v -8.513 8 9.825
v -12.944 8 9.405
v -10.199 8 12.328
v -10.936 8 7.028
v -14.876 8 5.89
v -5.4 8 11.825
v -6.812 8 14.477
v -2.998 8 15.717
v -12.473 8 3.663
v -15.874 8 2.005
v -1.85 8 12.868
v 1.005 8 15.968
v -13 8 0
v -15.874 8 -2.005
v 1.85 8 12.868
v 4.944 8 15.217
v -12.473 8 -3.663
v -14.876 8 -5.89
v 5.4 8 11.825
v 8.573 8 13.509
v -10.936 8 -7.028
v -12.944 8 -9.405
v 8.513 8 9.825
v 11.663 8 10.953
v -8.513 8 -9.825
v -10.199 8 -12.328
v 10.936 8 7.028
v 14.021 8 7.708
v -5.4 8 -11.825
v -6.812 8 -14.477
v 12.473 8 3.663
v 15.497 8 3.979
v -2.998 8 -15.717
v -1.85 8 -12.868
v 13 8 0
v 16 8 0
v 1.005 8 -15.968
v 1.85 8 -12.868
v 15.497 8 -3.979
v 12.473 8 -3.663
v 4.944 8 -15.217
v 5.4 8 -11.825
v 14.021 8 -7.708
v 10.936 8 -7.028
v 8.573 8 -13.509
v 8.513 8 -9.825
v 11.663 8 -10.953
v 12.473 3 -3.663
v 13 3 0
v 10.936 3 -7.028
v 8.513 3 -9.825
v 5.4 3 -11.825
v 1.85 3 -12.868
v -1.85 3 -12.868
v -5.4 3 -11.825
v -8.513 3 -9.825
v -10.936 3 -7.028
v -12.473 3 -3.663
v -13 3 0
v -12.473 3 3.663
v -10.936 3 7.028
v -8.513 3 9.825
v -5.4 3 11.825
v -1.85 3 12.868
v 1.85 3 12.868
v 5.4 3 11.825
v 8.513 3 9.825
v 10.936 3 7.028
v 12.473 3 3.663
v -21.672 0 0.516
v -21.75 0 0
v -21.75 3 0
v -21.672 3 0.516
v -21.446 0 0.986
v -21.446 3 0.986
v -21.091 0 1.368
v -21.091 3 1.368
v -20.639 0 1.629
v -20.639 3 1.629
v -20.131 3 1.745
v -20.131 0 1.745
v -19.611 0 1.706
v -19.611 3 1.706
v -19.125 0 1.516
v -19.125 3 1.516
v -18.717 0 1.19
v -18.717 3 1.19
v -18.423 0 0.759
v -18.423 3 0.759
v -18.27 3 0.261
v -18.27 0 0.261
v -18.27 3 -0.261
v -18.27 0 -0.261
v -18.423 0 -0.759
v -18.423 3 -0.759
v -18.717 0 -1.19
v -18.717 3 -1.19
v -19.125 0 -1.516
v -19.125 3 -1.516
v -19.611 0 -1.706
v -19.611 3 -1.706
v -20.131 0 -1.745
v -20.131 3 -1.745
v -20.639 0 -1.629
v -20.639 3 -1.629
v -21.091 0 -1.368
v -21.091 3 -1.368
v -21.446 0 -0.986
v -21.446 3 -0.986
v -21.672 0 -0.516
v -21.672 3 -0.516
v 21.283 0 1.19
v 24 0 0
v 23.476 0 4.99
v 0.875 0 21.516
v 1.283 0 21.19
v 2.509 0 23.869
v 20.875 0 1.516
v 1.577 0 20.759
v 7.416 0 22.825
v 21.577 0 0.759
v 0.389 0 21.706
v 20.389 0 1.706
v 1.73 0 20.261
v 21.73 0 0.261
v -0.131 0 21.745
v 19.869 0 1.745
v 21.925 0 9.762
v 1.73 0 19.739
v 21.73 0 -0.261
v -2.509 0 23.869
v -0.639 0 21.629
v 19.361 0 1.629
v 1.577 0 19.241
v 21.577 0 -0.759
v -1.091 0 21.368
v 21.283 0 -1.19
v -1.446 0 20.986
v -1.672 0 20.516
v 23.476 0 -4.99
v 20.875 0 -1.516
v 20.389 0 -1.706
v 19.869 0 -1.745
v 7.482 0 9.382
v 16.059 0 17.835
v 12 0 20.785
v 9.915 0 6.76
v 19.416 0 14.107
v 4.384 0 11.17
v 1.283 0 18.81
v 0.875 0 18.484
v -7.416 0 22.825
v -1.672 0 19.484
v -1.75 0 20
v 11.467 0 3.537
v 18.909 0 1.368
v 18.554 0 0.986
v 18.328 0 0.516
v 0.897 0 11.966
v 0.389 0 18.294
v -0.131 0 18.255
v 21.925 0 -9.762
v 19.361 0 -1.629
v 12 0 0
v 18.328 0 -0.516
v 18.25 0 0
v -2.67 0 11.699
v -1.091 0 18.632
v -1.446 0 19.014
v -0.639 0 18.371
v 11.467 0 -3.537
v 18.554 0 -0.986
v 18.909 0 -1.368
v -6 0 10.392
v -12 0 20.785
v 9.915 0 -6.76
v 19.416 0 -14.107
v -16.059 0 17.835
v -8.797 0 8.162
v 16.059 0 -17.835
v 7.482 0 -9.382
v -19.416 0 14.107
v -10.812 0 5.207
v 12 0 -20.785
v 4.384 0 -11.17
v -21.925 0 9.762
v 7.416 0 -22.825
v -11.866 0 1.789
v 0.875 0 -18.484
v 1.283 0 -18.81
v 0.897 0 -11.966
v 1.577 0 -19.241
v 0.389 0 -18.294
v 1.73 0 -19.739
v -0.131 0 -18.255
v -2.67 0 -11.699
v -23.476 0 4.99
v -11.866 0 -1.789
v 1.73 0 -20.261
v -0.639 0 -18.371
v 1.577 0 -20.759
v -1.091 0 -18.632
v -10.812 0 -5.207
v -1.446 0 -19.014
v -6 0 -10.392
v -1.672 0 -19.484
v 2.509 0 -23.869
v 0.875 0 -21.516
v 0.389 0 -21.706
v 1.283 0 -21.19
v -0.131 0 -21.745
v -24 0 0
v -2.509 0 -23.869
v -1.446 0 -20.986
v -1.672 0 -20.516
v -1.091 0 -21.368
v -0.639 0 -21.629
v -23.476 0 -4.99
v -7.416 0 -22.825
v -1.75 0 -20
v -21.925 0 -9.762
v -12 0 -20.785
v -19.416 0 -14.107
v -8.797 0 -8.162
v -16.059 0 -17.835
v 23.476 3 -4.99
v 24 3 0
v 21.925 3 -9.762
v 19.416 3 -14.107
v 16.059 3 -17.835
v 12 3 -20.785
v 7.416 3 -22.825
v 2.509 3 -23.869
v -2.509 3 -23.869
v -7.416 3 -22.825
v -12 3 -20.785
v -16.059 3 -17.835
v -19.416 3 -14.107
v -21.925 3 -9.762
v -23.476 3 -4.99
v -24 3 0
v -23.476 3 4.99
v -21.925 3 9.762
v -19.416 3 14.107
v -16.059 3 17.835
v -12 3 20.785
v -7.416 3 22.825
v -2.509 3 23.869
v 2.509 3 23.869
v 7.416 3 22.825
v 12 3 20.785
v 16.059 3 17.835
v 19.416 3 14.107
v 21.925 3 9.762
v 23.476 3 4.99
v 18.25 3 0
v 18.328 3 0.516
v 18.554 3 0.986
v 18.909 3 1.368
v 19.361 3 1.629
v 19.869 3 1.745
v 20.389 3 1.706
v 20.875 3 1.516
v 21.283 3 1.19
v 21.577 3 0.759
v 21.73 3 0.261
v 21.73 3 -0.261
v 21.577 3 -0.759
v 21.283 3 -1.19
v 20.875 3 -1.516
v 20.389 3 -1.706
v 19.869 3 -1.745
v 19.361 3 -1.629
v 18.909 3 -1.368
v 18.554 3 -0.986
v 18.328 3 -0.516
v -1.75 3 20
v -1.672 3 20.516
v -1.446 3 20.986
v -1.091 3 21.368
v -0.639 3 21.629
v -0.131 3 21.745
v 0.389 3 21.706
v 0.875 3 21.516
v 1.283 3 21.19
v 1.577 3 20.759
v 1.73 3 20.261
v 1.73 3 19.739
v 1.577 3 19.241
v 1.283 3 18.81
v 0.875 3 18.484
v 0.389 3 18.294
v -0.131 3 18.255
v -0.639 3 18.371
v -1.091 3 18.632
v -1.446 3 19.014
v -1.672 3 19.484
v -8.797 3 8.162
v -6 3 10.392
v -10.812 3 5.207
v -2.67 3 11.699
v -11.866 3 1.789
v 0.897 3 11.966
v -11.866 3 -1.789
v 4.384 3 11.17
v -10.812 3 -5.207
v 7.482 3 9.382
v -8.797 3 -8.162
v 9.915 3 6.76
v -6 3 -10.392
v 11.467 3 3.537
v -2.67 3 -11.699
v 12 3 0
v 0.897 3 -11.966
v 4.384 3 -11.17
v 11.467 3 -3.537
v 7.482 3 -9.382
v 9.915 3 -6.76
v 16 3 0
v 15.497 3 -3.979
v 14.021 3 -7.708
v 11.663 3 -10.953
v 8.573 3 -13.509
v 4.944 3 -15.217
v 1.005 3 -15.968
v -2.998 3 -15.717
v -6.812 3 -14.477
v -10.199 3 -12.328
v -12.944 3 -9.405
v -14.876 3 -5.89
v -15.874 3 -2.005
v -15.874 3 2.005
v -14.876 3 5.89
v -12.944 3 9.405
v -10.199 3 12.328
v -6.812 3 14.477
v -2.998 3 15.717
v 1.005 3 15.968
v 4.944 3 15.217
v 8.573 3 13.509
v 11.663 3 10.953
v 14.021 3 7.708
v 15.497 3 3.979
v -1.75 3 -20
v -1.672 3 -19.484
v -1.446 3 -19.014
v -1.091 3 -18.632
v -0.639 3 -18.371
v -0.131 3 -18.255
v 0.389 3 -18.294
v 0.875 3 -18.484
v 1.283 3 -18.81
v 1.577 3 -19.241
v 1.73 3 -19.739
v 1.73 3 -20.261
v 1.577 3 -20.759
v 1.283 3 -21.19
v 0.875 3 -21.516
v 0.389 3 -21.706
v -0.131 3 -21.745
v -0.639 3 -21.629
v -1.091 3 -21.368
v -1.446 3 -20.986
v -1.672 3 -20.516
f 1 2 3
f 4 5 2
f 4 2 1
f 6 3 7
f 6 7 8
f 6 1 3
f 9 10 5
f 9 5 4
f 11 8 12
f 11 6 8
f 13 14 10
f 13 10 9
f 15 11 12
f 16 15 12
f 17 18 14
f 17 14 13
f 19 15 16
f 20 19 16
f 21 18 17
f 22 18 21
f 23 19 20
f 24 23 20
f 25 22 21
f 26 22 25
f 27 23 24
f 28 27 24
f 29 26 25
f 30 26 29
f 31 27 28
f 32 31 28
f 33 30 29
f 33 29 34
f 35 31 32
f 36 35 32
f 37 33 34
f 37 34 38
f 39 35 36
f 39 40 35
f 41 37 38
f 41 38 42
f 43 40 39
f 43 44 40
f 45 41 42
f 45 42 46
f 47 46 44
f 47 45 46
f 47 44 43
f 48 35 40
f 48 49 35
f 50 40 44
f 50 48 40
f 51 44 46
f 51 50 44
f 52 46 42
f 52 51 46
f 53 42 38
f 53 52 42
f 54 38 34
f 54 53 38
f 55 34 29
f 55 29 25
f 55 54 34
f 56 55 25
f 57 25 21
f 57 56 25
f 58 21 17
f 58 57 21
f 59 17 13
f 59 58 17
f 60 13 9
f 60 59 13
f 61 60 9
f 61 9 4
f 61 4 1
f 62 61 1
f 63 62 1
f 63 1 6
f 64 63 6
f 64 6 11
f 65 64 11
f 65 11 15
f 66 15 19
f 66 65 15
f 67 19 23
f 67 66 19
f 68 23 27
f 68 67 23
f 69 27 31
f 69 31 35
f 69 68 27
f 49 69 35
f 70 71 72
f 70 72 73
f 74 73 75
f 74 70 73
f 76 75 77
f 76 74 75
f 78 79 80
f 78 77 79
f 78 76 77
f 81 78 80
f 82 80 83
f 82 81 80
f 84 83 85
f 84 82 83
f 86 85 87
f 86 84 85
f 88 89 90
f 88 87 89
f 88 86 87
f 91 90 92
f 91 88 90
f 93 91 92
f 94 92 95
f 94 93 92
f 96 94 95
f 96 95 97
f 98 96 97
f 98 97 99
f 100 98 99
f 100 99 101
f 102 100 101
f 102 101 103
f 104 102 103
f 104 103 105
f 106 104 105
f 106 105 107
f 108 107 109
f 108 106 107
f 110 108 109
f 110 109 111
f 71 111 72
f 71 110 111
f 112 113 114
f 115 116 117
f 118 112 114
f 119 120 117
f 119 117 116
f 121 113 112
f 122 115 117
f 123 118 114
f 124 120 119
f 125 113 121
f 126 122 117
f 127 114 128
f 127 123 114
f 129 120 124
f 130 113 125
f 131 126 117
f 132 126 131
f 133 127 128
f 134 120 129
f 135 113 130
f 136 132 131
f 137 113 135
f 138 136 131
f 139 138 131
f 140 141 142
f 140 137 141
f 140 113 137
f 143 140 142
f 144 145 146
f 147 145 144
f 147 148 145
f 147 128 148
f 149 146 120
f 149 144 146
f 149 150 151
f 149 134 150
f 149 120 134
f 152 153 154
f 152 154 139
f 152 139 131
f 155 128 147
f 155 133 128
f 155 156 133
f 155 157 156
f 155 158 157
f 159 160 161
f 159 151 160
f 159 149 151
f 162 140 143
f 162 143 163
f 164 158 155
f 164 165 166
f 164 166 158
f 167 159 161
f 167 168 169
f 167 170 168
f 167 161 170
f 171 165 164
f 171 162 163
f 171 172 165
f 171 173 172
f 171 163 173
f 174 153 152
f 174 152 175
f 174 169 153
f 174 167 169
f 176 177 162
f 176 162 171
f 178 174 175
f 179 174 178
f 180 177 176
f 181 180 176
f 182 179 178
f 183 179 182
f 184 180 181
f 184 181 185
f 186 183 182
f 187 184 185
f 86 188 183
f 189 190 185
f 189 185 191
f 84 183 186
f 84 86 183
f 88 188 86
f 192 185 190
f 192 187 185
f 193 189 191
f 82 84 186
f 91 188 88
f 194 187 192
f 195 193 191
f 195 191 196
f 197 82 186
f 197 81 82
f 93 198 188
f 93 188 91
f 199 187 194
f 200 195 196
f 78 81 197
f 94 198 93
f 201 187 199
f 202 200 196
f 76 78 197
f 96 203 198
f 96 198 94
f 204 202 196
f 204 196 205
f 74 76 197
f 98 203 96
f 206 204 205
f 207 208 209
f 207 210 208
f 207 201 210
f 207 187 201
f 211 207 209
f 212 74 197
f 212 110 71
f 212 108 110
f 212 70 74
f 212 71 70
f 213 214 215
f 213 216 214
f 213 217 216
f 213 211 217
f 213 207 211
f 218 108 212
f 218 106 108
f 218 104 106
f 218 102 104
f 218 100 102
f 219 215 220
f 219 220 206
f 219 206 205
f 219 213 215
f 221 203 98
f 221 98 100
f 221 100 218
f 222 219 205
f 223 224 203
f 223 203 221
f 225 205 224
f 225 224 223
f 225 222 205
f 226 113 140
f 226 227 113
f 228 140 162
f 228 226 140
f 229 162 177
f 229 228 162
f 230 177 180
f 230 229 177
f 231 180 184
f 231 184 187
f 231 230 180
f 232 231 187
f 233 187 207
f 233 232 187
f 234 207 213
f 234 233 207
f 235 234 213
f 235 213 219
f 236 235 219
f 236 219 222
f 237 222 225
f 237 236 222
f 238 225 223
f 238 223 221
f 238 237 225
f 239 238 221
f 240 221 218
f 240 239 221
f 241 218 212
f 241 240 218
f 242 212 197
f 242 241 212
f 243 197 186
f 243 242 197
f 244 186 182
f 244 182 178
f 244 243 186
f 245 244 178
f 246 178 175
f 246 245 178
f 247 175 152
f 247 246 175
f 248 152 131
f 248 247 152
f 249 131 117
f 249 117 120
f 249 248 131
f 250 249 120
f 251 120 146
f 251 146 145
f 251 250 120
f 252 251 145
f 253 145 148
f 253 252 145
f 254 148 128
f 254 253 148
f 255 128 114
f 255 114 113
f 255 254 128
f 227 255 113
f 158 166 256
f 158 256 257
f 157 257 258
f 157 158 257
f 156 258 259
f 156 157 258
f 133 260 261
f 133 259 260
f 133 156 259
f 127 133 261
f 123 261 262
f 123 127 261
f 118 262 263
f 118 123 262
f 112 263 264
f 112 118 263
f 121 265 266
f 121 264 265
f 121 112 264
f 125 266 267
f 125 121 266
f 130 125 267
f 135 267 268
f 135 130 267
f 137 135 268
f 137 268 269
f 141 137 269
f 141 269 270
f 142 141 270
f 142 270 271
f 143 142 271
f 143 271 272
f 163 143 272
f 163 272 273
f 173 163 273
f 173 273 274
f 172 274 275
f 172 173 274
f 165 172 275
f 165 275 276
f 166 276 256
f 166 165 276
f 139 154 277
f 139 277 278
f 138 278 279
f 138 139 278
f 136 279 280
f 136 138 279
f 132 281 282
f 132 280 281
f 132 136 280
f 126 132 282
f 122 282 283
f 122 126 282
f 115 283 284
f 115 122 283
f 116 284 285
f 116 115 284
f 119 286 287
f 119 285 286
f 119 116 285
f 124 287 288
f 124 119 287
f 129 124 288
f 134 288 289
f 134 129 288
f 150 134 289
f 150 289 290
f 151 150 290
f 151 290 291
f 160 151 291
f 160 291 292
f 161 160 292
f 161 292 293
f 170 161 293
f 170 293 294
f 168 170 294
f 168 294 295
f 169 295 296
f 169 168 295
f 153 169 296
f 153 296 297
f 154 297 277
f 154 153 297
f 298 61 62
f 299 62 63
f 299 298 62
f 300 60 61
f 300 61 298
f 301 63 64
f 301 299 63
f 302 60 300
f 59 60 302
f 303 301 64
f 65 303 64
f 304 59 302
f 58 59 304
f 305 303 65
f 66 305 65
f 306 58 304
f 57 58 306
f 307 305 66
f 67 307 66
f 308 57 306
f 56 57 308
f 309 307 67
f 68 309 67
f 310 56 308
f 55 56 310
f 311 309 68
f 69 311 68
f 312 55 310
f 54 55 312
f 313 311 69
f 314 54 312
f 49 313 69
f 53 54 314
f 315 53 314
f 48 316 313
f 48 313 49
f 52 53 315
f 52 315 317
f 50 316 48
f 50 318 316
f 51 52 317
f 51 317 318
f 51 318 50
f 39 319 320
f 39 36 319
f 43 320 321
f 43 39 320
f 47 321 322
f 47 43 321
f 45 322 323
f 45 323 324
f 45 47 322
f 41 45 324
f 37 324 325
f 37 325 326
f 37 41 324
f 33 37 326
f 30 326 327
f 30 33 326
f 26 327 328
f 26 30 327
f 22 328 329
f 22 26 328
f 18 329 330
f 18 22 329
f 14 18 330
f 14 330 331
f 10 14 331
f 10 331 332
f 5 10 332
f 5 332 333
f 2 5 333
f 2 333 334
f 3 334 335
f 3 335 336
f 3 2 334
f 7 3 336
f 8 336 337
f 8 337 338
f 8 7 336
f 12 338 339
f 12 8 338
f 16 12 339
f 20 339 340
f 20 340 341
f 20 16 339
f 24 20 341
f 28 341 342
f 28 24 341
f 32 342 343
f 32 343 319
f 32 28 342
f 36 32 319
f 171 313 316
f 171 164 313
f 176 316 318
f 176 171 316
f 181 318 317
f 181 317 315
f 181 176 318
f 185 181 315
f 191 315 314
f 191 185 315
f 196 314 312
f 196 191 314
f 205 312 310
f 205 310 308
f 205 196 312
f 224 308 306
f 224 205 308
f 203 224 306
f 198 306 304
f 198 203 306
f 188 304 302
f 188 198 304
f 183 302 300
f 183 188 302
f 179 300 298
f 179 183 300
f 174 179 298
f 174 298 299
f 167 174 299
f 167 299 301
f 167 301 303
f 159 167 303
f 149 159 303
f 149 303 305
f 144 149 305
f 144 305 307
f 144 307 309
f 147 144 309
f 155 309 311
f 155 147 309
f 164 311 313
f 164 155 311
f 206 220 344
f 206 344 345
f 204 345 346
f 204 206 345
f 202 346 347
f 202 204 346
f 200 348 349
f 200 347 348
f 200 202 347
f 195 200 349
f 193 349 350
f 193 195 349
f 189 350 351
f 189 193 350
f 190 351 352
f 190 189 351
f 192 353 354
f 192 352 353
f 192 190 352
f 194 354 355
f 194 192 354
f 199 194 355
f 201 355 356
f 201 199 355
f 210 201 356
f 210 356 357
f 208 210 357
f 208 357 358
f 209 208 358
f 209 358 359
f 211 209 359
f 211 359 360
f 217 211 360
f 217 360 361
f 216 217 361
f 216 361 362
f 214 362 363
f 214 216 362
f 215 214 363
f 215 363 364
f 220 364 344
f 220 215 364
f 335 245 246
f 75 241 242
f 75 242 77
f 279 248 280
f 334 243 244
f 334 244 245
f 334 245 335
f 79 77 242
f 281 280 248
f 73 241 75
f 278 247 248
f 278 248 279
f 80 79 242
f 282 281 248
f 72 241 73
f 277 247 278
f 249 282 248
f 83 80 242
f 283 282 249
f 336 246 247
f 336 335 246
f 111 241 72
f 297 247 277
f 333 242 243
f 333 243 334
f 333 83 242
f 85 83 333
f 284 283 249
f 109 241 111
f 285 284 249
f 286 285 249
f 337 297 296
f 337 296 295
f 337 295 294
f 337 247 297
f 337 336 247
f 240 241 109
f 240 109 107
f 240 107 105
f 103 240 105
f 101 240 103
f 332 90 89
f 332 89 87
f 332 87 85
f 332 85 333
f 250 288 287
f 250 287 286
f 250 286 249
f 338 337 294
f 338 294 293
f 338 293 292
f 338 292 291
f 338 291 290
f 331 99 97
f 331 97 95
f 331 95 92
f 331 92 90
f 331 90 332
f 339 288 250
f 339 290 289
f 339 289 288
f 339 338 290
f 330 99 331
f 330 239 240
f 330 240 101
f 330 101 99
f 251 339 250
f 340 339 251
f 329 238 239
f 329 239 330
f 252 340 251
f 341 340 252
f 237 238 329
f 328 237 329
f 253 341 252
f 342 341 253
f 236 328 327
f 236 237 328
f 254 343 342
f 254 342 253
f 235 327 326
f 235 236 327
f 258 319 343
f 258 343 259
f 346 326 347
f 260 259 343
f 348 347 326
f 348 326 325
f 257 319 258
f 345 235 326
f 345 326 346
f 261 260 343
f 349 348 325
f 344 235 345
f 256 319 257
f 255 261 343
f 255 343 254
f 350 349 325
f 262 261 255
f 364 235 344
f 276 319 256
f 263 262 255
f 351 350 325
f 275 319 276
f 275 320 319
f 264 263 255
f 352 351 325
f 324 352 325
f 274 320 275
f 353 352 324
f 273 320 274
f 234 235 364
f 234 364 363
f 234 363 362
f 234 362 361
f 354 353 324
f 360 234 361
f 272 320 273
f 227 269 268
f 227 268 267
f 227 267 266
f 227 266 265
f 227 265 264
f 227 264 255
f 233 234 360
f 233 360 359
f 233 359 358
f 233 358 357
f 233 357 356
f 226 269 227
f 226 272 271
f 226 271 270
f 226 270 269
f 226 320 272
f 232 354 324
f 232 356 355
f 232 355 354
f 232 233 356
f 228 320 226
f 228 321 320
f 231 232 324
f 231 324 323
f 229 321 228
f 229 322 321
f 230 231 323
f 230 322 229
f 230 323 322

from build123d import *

# Parameters (mm, degrees)
CUT_EXTRUDE_1_DEPTH      = 35.307433597
CUT_EXTRUDE_1_DEPTH_BACK = 35.307433597
SKETCH_2_R               = 1.75


with BuildPart() as part:
    # 草图1 → 旋转1 (revolve)
    with BuildSketch(Plane.XY, mode=Mode.PRIVATE) as revolve_1_sk:
        Polygon((-12, 0), (-24, 0), (-24, 3), (-16, 3), (-16, 8), (-13, 8), (-13, 3), (-12, 3), align=None)
    revolve(revolve_1_sk.sketch.rotate(Axis((0, -271.309816207, 0), (0, 1, 0)), 180), axis=Axis((0, -271.309816207, 0), (0, 1, 0)))

    # 草图2 → 切除-拉伸1 (cut, two sides: drawn at the far end of the back side and taken through both)
    with BuildSketch(Plane(origin=(0, 3, 0), x_dir=(1, 0, 0), z_dir=(0, 1, 0)).offset(-CUT_EXTRUDE_1_DEPTH_BACK)):
        with Locations(Location((0, 20, 0), (0, 0, 180))):
            Circle(SKETCH_2_R)
        with Locations(Location((20, 0, 0), (0, 0, 180))):
            Circle(SKETCH_2_R)
        with Locations(Location((0, -20, 0), (0, 0, 180))):
            Circle(SKETCH_2_R)
        with Locations(Location((-20, 0, 0), (0, 0, 180))):
            Circle(SKETCH_2_R)
    extrude(amount=CUT_EXTRUDE_1_DEPTH + CUT_EXTRUDE_1_DEPTH_BACK, mode=Mode.SUBTRACT)


solid = part.part
